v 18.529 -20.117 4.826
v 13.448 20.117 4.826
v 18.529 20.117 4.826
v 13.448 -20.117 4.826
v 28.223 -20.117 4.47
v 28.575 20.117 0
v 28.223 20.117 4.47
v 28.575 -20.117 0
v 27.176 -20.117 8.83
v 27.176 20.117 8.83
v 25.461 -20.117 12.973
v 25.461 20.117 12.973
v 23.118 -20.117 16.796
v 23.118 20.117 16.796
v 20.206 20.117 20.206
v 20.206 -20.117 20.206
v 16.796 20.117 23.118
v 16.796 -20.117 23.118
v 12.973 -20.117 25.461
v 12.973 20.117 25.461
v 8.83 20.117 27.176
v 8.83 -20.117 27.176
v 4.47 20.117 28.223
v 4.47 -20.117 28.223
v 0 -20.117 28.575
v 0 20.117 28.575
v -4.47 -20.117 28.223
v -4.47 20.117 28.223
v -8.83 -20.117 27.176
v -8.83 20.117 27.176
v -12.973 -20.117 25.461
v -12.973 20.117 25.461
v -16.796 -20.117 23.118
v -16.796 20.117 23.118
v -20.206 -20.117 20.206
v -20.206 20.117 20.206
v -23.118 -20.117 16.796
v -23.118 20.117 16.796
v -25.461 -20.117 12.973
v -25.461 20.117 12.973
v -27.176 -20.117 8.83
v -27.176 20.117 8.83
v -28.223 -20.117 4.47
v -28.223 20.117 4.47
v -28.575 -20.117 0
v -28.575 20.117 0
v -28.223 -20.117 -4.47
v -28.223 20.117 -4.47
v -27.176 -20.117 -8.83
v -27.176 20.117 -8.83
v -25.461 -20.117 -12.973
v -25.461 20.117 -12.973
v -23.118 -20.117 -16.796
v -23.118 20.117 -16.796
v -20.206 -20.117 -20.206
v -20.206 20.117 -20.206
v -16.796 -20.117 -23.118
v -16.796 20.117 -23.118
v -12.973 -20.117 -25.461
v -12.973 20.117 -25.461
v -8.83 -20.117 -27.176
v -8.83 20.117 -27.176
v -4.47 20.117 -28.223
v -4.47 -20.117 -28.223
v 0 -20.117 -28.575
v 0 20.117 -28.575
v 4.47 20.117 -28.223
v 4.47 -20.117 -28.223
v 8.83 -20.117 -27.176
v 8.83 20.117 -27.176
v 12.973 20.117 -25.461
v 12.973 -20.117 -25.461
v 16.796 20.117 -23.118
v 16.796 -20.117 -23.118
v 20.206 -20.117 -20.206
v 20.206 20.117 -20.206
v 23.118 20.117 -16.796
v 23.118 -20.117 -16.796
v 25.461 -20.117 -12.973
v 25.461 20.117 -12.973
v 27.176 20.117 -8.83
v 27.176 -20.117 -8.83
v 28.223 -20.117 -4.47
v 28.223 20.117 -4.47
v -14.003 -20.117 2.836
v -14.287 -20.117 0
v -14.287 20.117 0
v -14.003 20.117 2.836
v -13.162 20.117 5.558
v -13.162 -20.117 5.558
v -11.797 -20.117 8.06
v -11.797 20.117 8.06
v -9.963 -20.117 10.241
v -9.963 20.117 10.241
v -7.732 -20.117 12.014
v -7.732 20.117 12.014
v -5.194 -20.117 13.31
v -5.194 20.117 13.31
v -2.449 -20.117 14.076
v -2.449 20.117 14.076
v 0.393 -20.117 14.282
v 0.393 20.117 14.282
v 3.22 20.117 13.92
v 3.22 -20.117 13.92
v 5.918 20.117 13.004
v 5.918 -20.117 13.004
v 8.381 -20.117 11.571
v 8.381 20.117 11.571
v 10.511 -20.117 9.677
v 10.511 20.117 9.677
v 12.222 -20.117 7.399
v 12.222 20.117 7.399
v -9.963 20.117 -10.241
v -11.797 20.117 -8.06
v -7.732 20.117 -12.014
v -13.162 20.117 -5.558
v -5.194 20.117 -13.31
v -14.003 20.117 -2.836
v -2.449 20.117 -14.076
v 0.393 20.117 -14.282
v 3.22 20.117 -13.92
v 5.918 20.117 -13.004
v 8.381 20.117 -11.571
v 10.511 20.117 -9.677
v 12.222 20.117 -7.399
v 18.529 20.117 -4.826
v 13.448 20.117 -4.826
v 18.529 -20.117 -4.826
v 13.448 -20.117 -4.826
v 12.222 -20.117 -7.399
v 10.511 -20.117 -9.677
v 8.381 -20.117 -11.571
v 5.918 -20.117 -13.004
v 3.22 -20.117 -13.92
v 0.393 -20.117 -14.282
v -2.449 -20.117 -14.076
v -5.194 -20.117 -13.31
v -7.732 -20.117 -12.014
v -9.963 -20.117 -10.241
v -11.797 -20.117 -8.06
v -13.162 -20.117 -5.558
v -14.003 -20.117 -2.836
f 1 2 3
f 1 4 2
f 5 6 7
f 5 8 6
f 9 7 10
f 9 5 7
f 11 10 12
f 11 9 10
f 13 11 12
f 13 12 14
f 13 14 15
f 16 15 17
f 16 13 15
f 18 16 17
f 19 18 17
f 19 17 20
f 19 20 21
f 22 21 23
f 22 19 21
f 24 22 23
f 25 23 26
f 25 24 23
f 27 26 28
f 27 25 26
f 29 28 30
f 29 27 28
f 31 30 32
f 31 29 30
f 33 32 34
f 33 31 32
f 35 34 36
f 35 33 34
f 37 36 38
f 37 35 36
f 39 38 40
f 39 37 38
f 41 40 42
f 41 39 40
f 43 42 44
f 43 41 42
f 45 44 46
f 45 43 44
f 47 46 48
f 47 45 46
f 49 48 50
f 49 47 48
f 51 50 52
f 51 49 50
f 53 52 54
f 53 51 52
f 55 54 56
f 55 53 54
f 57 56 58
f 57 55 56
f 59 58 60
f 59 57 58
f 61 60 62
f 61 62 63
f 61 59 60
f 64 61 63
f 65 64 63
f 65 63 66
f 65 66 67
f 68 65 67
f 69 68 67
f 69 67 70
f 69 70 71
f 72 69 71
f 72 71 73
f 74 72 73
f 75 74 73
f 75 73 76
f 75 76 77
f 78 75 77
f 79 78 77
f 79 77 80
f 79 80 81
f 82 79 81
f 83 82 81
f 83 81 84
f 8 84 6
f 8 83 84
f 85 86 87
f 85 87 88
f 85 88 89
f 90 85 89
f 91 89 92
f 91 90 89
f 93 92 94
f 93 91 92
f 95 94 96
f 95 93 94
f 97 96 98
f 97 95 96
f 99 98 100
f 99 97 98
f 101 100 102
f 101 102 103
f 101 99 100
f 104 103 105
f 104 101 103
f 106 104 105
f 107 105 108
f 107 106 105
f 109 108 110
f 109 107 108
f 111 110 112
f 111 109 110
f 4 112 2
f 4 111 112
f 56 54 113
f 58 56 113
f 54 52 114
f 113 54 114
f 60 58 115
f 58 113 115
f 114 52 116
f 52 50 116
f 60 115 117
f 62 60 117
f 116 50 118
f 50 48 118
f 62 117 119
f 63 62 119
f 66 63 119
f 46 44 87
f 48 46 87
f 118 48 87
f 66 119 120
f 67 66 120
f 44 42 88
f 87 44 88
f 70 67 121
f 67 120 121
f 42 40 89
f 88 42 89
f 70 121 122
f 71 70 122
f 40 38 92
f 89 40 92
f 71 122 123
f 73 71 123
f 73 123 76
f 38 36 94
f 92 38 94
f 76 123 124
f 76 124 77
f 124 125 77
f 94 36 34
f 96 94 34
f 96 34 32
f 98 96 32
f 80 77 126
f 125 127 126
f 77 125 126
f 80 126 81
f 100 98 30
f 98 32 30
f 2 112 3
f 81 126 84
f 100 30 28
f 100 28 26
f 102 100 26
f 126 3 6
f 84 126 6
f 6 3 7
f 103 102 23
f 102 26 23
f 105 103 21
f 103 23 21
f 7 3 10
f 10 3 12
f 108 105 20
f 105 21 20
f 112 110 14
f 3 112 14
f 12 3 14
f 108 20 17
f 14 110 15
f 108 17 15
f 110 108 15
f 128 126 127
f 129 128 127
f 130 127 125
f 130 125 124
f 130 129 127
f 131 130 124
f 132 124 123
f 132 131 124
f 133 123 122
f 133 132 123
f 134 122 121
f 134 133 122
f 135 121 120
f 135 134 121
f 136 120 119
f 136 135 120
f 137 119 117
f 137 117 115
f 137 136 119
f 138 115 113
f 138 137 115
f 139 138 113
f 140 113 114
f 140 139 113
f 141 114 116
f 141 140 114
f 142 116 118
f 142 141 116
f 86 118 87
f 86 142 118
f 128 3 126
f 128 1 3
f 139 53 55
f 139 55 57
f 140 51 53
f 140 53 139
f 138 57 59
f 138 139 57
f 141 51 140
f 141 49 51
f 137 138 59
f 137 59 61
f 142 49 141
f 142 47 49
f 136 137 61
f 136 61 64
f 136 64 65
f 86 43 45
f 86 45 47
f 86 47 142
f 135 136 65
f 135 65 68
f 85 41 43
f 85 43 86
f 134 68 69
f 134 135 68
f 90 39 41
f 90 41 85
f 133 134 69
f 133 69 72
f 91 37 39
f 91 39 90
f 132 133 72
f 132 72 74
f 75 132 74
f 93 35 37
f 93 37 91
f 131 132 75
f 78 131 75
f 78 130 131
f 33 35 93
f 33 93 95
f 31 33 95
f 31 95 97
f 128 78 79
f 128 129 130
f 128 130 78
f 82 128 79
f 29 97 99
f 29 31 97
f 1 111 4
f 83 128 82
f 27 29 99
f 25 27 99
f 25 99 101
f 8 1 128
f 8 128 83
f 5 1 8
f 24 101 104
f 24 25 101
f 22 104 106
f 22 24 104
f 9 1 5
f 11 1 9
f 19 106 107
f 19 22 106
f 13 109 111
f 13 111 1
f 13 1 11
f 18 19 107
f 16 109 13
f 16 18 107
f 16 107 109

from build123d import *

# Parameters (mm, degrees)
F0_R     = 28.575
F1_DEPTH = 20.1168


with BuildPart() as f1:
    # F0 (on Front) → F1 (new body, symmetric)
    with BuildSketch(Plane.XZ):
        Circle(F0_R)
        with BuildLine():
            ThreePointArc((-14.2875, 0), (-2.449257, 14.076001), (13.447765, 4.826))
            Line((13.447765, 4.826), (18.5293, 4.826))
            Line((18.5293, 4.826), (18.5293, 0))
            Line((18.5293, 0), (18.5293, -4.826))
            Line((18.5293, -4.826), (13.447765, -4.826))
            ThreePointArc((13.447765, -4.826), (-2.449257, -14.076001), (-14.2875, 0))
        make_face(mode=Mode.SUBTRACT)
    extrude(amount=F1_DEPTH, both=True)


solid = f1.part
